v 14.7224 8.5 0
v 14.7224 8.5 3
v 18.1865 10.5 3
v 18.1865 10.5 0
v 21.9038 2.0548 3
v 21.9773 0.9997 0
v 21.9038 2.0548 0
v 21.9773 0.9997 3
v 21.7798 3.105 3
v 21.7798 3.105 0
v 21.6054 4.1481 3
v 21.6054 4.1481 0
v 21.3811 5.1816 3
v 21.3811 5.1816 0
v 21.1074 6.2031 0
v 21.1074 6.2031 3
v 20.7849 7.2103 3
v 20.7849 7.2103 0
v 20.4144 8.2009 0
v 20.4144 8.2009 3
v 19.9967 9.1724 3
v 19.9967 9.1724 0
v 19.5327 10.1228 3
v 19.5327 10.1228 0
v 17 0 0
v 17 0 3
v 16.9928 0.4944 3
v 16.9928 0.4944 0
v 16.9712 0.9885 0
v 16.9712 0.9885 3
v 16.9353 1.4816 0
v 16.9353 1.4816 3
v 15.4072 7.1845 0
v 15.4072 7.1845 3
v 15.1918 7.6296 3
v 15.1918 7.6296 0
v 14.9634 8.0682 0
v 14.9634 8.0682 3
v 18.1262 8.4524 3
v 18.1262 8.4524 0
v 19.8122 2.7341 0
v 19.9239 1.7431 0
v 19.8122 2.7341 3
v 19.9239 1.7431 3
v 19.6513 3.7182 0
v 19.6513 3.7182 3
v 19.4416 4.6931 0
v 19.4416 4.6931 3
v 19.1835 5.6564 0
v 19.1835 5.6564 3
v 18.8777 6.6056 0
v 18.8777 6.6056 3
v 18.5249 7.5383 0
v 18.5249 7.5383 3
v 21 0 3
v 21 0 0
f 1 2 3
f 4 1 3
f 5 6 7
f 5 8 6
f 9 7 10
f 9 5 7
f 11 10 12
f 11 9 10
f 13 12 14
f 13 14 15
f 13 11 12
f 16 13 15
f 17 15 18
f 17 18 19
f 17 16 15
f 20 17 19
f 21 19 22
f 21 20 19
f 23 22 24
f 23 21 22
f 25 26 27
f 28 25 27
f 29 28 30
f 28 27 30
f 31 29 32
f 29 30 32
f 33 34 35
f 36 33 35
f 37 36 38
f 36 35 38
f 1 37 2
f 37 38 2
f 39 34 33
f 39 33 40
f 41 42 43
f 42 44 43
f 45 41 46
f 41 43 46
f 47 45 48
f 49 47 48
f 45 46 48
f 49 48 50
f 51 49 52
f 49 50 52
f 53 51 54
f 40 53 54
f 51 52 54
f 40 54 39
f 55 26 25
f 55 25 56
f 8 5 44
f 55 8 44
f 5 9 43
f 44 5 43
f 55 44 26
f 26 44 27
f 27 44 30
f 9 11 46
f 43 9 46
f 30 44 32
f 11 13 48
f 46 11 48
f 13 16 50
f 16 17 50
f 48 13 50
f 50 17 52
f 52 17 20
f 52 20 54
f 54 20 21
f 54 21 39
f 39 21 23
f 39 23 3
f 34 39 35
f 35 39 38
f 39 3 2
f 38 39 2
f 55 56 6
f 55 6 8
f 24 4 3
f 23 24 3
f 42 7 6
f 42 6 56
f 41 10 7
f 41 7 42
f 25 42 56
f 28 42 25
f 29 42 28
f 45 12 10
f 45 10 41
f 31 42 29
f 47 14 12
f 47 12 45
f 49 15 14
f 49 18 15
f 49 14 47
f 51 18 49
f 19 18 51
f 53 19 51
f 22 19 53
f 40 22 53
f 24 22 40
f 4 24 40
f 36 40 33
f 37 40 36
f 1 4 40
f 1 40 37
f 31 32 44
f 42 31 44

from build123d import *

# Parameters (mm, degrees)
CYLINDER001_W            = 17
CYLINDER001_H            = 3
CYLINDER001_ANGLE        = 30
CYLINDER_W               = 20
CYLINDER_H               = 3
CYLINDER_ANGLE           = 20
CYLINDER_PLACEMENT_ANGLE = 5
CYLINDER002_W            = 22
CYLINDER002_H            = 3
CYLINDER002_ANGLE        = 30
CHAMFER007003_SIZE       = 1


with BuildPart() as cylinder001:
    # Cylinder001 → Cylinder001 (revolve)
    with BuildSketch(Plane.XZ):
        with Locations((8.5, 1.5)):
            Rectangle(CYLINDER001_W, CYLINDER001_H)
    revolve(axis=Axis((0, 0, 0), (0, 0, 1)), revolution_arc=CYLINDER001_ANGLE)


with BuildPart() as cylinder:
    # Cylinder → Cylinder (revolve)
    with BuildSketch(Plane.XZ):
        with Locations((10, 1.5)):
            Rectangle(CYLINDER_W, CYLINDER_H)
    revolve(axis=Axis((0, 0, 0), (0, 0, 1)), revolution_arc=CYLINDER_ANGLE)


with BuildPart() as cylinder_1:
    # Cylinder placement: moved
    add(cylinder.part.rotate(Axis((0, 0, 0), (0, 0, 1)), CYLINDER_PLACEMENT_ANGLE))


with BuildPart() as chamfer007003:
    # Cylinder002 → Cylinder002 (revolve)
    with BuildSketch(Plane.XZ):
        with Locations((11, 1.5)):
            Rectangle(CYLINDER002_W, CYLINDER002_H)
    revolve(axis=Axis((0, 0, 0), (0, 0, 1)), revolution_arc=CYLINDER002_ANGLE)

    # Cut001: cut Cylinder
    add(cylinder_1.part, mode=Mode.SUBTRACT)

    # Cut002: cut Cylinder001
    add(cylinder001.part, mode=Mode.SUBTRACT)

    # Chamfer007003
    chamfer007003_edges = [chamfer007003.edges().sort_by_distance(p)[0] for p in [
        (19.052559, 11, 1.5),
        (22, 0, 1.5),
    ]]
    chamfer(chamfer007003_edges, length=CHAMFER007003_SIZE)


solid = chamfer007003.part
